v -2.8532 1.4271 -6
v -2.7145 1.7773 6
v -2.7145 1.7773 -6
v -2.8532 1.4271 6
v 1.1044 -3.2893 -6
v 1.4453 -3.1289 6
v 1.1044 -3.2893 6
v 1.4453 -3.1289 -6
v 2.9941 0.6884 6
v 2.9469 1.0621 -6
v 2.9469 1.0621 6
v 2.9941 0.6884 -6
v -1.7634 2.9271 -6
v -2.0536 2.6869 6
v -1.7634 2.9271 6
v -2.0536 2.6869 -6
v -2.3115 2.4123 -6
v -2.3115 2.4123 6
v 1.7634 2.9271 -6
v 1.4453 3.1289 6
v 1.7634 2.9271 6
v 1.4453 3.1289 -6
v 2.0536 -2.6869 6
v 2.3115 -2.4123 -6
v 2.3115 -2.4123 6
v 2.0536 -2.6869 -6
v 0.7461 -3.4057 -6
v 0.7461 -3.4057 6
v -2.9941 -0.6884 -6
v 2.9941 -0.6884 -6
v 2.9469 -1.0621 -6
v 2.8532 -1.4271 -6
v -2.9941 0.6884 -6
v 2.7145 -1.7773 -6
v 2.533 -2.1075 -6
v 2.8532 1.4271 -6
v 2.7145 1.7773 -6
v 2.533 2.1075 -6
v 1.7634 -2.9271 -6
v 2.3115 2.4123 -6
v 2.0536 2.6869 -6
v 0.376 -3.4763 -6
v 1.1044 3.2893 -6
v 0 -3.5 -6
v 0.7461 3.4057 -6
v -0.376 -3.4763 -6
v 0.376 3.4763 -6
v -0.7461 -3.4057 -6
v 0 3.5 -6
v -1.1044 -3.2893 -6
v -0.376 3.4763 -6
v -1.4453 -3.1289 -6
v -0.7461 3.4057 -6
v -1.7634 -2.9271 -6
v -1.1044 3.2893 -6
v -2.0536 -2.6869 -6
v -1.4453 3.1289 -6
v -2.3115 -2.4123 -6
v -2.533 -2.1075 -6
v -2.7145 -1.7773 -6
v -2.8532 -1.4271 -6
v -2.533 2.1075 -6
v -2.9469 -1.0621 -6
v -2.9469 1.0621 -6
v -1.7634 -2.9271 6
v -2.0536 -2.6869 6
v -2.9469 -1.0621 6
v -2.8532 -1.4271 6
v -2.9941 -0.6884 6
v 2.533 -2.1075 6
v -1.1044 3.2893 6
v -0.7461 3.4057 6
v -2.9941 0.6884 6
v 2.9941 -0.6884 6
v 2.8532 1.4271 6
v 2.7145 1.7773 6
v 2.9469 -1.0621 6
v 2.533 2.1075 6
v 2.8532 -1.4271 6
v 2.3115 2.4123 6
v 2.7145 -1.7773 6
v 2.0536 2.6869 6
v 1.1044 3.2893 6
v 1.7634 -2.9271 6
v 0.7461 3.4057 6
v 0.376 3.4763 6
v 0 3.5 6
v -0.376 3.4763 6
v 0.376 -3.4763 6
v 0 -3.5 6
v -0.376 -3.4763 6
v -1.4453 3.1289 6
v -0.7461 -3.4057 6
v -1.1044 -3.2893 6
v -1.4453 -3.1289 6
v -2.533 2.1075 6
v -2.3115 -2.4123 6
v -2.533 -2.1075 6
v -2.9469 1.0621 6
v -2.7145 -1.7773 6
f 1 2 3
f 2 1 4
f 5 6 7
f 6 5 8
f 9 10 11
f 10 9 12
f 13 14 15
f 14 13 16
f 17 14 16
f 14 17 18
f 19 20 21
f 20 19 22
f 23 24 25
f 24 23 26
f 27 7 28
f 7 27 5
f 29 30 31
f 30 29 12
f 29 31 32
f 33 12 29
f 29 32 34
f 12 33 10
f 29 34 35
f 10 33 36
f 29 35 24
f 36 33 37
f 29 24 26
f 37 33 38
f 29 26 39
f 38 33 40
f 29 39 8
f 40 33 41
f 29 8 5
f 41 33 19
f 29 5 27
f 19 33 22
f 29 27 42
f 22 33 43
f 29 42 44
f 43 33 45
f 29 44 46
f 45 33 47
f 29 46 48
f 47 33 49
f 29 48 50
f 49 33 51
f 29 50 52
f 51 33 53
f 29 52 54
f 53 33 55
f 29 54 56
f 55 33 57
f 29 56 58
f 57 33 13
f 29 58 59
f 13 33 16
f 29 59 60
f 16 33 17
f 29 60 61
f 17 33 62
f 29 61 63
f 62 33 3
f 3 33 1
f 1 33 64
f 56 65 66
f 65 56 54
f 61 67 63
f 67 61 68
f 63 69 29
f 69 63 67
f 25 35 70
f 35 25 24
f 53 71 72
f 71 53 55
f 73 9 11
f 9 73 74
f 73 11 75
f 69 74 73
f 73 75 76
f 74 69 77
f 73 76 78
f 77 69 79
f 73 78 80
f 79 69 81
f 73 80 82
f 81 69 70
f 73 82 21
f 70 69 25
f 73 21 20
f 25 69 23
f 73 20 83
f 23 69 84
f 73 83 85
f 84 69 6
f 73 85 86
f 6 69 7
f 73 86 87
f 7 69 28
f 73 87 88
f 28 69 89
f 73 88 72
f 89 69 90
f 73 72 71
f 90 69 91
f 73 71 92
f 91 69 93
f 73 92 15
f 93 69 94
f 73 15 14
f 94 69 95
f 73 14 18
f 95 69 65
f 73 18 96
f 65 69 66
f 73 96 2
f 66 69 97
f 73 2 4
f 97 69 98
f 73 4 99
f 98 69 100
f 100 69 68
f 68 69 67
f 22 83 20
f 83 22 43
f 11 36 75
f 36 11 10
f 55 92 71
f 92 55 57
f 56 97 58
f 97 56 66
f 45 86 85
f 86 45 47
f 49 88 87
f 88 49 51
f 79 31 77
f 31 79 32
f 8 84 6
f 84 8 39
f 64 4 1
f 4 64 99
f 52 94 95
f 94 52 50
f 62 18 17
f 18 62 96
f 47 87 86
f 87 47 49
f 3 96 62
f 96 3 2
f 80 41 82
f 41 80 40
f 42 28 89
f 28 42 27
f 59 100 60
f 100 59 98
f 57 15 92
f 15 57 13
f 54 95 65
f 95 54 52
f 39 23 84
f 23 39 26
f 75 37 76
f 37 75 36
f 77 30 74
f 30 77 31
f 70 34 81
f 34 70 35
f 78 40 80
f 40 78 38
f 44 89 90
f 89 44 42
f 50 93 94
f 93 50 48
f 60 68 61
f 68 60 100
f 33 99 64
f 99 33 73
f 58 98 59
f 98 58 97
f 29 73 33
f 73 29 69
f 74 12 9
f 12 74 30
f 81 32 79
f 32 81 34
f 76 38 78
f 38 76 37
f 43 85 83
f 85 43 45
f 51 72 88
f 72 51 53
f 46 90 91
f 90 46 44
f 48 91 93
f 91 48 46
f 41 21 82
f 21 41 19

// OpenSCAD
$fn = 50;

difference() {
	union() {
		translate(v = [0, 0, -6.0]) {
			rotate(a = [0, 0, 90]) {
				difference() {
					union() {
						hull() {
							translate(v = [0.5, 0, 0]) {
								cylinder(h = 12, r = 3, r1 = 3, r2 = 3);
							}
							translate(v = [-0.5, 0, 0]) {
								cylinder(h = 12, r = 3, r1 = 3, r2 = 3);
							}
						}
					}
					union();
				}
			}
		}
	}
	union();
}
